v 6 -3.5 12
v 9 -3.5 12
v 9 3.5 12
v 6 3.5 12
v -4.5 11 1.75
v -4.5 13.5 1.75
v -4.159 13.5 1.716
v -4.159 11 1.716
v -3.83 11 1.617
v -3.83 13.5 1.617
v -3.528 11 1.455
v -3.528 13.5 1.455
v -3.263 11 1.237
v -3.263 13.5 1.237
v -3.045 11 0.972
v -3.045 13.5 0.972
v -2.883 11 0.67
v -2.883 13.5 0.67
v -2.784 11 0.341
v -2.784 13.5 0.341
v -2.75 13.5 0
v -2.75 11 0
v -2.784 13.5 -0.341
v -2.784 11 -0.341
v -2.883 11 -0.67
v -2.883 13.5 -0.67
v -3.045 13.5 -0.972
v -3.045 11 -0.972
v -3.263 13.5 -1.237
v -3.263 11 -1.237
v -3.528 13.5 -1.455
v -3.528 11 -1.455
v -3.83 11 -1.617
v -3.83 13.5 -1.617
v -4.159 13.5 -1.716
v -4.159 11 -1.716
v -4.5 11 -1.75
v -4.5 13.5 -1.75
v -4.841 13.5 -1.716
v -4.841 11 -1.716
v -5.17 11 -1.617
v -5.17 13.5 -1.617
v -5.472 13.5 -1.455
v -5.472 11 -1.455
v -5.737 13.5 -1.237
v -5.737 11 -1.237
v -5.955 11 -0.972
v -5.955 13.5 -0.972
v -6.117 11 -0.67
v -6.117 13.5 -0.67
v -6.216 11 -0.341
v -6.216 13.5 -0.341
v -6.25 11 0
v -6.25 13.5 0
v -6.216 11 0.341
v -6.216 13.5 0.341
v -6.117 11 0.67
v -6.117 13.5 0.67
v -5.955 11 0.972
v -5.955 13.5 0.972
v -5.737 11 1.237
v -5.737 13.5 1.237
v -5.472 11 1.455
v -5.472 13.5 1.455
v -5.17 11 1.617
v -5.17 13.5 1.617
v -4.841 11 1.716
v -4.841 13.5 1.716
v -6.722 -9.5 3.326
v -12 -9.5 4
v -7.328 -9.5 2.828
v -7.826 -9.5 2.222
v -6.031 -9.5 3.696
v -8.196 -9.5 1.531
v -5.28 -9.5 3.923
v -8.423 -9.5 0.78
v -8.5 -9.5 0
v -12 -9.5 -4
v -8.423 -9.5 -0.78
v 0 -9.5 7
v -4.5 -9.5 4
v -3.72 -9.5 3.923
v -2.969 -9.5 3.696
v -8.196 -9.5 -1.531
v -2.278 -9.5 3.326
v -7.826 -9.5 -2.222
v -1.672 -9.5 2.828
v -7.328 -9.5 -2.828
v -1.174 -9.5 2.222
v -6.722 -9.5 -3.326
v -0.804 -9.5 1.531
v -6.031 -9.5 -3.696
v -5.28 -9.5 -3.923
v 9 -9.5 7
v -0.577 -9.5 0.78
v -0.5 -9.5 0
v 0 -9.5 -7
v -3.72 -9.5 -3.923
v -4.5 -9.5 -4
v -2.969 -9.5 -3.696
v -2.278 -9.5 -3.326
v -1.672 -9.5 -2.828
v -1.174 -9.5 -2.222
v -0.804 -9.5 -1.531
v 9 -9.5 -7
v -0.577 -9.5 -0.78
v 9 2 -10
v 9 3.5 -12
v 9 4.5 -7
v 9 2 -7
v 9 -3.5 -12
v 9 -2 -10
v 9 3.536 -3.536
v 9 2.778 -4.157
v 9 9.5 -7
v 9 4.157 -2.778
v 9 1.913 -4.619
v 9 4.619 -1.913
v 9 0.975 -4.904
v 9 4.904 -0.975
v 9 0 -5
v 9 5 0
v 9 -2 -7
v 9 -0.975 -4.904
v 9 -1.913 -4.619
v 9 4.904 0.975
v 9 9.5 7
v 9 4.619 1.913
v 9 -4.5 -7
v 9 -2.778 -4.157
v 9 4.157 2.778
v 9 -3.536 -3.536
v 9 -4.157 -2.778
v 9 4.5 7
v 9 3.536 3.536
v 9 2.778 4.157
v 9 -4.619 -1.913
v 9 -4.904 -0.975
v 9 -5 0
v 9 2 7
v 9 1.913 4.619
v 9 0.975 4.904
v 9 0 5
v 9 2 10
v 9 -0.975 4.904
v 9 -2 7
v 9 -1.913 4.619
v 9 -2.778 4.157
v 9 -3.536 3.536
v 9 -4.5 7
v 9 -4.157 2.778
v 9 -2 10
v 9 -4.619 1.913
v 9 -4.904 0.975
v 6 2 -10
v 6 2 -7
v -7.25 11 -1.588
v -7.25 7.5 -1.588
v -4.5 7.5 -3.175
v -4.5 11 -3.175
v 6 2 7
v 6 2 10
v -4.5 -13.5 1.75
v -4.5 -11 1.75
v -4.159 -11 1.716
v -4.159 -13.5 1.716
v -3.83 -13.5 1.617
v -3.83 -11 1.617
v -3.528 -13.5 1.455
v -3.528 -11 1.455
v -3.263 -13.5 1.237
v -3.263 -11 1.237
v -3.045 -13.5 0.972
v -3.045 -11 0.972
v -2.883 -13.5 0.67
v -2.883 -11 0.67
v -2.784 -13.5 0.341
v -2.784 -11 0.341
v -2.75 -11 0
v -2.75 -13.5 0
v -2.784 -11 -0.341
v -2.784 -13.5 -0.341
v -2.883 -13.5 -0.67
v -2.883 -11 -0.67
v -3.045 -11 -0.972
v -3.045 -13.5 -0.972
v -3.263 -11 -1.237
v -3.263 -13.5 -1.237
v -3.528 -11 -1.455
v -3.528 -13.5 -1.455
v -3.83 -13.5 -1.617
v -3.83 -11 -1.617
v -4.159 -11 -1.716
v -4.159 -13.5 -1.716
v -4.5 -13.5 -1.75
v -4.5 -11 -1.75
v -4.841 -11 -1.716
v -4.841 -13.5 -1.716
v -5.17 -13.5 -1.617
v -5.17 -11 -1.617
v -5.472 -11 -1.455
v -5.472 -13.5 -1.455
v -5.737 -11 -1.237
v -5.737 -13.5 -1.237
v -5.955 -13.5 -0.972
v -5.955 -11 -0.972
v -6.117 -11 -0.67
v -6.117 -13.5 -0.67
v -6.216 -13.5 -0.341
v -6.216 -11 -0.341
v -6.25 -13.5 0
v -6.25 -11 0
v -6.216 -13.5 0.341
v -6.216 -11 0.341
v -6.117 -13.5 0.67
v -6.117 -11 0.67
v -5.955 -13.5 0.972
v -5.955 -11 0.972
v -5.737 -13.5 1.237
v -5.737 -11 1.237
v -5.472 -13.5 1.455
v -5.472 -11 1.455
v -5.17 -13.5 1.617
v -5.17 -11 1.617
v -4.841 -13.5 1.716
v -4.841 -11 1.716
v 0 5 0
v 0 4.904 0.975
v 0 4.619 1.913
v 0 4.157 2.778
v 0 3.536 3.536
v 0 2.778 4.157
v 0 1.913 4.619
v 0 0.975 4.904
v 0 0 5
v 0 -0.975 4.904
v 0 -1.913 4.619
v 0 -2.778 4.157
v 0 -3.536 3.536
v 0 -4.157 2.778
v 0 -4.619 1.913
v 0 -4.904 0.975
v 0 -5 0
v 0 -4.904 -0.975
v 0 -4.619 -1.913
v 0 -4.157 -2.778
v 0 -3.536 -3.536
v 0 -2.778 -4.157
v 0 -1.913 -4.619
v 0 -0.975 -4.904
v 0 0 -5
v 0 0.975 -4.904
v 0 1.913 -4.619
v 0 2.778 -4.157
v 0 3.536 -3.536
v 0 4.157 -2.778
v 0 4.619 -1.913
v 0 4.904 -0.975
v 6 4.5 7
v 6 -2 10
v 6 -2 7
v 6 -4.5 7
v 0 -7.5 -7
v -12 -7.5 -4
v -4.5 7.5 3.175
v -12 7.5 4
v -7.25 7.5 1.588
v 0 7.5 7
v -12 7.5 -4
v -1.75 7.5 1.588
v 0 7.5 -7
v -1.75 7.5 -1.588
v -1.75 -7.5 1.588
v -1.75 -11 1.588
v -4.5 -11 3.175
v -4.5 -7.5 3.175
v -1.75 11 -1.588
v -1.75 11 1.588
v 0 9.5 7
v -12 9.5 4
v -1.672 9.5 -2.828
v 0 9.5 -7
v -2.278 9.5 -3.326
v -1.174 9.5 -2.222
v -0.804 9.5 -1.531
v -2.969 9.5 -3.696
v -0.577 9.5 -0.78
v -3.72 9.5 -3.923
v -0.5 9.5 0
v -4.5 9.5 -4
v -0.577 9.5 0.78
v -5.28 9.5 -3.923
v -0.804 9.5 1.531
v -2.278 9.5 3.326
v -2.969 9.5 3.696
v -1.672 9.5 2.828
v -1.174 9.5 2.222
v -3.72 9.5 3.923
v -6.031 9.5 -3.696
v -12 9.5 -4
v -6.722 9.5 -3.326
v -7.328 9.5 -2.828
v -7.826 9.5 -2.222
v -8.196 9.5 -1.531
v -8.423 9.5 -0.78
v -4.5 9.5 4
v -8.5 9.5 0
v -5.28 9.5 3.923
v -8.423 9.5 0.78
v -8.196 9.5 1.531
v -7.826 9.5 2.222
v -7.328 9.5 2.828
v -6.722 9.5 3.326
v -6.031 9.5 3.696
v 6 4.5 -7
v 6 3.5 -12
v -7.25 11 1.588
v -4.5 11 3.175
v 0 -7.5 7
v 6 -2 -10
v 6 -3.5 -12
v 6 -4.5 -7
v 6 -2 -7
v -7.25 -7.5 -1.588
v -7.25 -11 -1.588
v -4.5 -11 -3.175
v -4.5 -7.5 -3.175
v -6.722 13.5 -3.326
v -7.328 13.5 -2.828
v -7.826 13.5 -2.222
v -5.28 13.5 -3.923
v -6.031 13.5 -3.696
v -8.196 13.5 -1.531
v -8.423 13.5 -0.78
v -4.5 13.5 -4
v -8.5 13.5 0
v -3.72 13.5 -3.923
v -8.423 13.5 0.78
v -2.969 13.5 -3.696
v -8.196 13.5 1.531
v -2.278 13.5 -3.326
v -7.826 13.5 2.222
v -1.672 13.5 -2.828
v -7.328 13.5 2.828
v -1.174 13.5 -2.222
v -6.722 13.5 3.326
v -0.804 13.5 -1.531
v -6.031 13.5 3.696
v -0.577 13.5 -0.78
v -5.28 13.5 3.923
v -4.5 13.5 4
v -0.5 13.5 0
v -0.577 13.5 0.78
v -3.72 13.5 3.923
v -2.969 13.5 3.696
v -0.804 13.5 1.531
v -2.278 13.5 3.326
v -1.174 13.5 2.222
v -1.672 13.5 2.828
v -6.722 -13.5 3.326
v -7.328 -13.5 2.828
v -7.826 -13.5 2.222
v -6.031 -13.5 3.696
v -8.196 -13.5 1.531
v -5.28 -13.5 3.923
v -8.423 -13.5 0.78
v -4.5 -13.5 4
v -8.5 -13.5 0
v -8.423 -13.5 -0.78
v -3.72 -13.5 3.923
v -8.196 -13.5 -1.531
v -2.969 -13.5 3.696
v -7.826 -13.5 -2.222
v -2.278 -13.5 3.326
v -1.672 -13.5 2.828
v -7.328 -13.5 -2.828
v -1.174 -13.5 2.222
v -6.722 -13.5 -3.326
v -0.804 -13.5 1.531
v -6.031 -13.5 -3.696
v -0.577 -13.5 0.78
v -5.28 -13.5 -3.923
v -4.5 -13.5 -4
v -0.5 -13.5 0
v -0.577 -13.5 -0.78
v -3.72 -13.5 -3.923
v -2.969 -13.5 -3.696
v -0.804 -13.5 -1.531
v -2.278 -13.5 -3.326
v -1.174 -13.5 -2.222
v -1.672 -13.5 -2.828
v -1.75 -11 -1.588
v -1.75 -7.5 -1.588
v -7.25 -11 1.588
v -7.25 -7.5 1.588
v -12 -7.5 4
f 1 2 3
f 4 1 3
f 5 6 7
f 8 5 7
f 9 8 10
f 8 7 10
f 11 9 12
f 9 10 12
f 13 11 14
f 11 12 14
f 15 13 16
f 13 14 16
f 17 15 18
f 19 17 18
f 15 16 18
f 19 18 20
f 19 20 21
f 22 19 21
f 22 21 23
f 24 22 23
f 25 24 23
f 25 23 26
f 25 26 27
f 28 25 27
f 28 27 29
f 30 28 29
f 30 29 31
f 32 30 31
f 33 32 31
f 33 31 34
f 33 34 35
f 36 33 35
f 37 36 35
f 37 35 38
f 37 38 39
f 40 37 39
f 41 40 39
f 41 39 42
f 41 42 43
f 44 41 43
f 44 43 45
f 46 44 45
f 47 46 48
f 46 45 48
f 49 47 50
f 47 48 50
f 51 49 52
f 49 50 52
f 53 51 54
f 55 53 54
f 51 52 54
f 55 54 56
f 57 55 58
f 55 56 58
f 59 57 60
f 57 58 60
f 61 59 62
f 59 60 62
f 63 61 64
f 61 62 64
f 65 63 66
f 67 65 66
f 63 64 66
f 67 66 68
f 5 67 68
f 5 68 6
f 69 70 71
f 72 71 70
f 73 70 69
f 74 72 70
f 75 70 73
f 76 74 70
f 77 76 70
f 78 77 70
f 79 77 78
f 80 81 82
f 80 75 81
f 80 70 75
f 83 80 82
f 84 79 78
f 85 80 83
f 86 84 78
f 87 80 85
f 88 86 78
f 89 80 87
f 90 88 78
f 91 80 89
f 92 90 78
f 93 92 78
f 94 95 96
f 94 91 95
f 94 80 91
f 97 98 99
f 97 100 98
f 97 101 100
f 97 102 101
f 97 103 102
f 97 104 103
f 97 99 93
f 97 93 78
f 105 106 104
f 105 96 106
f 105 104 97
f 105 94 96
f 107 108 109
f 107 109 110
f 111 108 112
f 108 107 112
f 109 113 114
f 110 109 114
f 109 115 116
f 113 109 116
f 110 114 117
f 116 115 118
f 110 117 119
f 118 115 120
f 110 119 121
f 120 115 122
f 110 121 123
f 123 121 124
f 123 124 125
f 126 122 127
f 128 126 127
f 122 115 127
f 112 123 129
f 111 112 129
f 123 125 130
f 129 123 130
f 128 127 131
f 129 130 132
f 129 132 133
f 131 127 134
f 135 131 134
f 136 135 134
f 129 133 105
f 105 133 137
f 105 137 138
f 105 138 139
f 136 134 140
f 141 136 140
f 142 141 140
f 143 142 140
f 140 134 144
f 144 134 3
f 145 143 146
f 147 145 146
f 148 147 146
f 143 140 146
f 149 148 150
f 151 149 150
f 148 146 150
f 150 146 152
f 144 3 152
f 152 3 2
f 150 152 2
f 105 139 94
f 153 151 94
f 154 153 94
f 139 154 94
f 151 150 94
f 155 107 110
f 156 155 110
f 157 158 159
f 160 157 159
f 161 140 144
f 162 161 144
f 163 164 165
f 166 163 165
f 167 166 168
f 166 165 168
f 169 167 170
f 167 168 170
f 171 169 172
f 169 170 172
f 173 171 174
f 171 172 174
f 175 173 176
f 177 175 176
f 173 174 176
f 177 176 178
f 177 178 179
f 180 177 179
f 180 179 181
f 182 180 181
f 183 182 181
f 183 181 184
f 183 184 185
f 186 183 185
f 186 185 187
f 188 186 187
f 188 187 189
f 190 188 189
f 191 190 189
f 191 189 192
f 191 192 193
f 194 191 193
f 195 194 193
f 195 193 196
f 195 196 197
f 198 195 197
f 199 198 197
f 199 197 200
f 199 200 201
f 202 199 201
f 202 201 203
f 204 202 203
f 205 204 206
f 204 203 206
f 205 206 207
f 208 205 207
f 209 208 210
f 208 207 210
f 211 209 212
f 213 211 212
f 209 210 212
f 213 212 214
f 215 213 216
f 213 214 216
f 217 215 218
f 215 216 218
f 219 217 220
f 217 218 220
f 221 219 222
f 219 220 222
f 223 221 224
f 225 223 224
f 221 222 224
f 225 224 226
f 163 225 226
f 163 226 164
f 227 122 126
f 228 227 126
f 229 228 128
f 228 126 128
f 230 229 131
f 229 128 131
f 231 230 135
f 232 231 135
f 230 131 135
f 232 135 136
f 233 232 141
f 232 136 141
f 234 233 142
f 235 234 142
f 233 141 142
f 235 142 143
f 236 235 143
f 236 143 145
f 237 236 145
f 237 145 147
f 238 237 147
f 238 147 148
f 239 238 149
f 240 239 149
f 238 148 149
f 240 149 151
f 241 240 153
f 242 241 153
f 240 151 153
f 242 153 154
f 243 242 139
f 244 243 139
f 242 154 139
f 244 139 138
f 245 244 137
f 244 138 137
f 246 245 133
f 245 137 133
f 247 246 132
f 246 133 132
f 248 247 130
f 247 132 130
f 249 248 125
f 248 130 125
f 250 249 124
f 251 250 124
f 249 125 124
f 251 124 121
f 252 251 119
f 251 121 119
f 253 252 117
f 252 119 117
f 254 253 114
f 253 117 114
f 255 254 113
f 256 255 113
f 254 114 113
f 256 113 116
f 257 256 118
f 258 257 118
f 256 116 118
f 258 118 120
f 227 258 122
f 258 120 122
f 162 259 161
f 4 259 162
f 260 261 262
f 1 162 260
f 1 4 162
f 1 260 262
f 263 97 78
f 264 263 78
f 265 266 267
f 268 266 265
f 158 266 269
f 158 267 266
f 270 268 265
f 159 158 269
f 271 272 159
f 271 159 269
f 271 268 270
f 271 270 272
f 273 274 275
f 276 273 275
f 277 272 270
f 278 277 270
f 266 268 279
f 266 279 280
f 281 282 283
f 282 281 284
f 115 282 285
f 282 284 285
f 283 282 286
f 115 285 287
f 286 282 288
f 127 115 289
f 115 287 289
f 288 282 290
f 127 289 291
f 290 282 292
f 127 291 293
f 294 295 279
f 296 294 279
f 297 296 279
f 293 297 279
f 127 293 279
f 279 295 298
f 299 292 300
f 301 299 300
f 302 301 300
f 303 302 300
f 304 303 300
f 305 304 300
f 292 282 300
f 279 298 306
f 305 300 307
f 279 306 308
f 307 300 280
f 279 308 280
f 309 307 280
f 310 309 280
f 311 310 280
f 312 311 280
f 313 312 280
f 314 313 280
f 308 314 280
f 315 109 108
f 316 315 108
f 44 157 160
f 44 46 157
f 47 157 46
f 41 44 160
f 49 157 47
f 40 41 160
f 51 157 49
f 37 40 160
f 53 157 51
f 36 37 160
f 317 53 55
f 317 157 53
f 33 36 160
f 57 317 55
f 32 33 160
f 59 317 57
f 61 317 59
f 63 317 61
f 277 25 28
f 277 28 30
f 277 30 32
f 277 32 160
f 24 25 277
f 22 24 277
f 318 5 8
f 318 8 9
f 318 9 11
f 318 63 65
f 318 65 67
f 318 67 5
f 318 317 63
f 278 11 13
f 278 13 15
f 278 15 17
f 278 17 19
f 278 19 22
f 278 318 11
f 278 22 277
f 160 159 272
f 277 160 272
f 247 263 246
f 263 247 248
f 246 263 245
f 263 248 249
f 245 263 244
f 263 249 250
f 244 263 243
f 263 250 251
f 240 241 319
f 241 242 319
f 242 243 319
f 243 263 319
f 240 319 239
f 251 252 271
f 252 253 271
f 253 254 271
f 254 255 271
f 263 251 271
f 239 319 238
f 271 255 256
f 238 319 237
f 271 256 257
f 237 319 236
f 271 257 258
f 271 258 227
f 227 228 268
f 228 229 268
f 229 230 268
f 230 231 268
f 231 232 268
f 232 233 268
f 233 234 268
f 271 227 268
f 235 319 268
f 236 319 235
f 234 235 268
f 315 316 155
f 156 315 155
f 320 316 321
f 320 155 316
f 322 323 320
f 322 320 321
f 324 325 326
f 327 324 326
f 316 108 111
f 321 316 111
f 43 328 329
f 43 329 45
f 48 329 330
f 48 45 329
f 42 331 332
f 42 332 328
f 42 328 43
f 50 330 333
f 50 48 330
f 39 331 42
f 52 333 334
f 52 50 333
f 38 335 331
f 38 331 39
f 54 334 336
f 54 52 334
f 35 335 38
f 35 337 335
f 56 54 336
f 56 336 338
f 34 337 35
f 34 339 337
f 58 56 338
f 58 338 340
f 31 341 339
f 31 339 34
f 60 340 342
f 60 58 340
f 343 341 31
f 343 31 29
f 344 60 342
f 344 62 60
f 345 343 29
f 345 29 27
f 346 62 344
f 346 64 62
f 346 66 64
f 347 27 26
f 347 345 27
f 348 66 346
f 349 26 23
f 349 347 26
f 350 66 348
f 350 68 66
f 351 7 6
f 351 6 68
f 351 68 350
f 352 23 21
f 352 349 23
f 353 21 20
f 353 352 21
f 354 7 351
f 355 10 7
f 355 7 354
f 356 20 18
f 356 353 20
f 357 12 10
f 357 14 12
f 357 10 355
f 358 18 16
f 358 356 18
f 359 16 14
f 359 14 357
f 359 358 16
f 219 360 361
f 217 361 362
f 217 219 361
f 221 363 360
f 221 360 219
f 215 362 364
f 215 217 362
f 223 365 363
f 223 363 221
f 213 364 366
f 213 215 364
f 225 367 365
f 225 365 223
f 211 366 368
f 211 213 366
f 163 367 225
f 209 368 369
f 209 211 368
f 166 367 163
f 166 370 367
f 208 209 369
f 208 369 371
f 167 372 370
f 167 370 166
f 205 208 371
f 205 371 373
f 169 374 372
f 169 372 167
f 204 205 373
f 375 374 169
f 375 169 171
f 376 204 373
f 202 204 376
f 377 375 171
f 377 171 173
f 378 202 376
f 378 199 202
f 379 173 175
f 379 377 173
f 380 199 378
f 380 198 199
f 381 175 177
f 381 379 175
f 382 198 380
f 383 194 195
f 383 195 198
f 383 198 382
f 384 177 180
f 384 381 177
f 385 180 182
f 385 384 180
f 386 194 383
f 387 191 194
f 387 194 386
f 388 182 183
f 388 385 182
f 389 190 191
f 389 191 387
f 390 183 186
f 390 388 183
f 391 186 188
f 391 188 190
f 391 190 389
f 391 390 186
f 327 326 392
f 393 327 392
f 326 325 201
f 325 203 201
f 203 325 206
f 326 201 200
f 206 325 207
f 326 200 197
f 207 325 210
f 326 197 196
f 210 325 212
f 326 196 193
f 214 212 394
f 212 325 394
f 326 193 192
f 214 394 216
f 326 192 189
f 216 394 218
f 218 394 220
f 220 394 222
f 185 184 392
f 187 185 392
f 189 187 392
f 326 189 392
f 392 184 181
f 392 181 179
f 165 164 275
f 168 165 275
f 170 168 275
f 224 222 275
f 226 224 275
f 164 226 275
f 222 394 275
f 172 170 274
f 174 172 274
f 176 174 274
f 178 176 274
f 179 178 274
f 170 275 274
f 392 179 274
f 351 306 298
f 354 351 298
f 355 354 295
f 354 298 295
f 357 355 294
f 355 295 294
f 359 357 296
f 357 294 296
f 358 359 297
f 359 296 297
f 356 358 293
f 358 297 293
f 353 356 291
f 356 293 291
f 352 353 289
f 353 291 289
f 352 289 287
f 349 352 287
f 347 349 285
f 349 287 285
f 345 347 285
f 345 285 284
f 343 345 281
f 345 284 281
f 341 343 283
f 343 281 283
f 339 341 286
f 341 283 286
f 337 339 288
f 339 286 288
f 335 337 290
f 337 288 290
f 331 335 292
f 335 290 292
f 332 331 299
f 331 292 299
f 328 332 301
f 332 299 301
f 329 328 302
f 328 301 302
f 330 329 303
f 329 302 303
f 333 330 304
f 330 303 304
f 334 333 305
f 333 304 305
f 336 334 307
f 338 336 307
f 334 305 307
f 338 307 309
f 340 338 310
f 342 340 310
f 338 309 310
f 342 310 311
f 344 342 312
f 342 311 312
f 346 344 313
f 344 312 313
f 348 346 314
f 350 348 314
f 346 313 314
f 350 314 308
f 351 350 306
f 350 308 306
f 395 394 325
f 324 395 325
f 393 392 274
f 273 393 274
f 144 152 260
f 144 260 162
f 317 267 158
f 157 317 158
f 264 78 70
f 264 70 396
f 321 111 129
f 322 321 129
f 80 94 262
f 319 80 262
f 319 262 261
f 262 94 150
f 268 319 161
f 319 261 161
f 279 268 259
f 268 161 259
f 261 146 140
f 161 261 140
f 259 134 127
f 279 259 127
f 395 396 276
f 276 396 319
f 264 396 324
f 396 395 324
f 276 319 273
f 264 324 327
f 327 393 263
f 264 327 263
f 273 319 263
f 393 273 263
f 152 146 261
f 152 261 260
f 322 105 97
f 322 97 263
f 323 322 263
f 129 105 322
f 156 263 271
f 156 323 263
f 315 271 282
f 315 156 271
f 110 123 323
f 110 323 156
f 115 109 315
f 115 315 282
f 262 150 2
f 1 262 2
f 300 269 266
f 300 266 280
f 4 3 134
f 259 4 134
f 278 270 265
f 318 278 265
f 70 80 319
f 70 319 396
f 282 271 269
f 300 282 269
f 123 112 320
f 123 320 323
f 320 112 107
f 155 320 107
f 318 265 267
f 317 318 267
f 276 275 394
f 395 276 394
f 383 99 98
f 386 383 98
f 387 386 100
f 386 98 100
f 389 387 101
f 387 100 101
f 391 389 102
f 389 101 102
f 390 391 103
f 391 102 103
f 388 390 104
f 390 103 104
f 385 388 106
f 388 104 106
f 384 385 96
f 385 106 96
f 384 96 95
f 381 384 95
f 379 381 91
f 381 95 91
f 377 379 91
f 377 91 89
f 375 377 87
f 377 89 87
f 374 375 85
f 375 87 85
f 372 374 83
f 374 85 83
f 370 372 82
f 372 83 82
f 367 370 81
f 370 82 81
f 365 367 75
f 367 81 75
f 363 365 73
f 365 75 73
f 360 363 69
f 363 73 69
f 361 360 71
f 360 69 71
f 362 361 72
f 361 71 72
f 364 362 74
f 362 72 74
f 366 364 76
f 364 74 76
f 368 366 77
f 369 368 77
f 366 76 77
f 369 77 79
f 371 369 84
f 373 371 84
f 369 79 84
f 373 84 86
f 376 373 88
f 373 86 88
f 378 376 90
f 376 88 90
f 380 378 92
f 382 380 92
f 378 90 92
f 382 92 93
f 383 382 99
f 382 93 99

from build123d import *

# Parameters (mm, degrees)
SKETCH_W        = 19
SKETCH_H        = 14
PAD_DEPTH       = 9
SKETCH001_R     = 5
POCKET_DEPTH    = 9
SKETCH002_W     = 2
SKETCH002_H     = 14
PAD001_DEPTH    = 12
POCKET001_DEPTH = 19.001
SKETCH004_R     = 4
PAD002_DEPTH    = 4
SKETCH005_R     = 4
PAD003_DEPTH    = 4
SKETCH006_R     = 1.75
POCKET002_DEPTH = 27.001
POCKET003_DEPTH = 11
SKETCH008_W     = 4
SKETCH008_H     = 3
PAD004_DEPTH    = 3


with BuildPart() as part:
    # Sketch → Pad (new body)
    with BuildSketch(Plane.YZ):
        Rectangle(SKETCH_W, SKETCH_H)
    extrude(amount=PAD_DEPTH)

    # Sketch001 (on Face6 of Pad) → Pocket (cut)
    with BuildSketch(Plane.YZ.offset(9)):
        Circle(SKETCH001_R)
    extrude(amount=-POCKET_DEPTH, mode=Mode.SUBTRACT)

    # Sketch002 (on Face4 of Pocket) → Pad001 (join)
    with BuildSketch(Plane(origin=(0, 0, 0), x_dir=(0, 1, 0), z_dir=(-1, 0, 0))):
        with Locations((-8.5, 0)):
            Rectangle(SKETCH002_W, SKETCH002_H)
        with Locations((8.5, 0)):
            Rectangle(SKETCH002_W, SKETCH002_H)
    extrude(amount=PAD001_DEPTH)

    # Sketch003 (on Face9 of Pad001) → Pocket001 (cut, through all)
    with BuildSketch(Plane(origin=(0, -9.5, 0), x_dir=(0, 0, -1), z_dir=(0, -1, 0))):
        Polygon((-4, -12), (-7, -12), (-7, 0), align=None)
        Polygon((7, 0), (4, -12), (7, -12), align=None)
    extrude(amount=-POCKET001_DEPTH, mode=Mode.SUBTRACT)

    # Sketch004 (on Face2 of Pocket001) → Pad002 (join)
    with BuildSketch(Plane(origin=(0, -9.5, 0), x_dir=(0, 0, -1), z_dir=(0, -1, 0))):
        with Locations((0, -4.5)):
            Circle(SKETCH004_R)
    extrude(amount=PAD002_DEPTH)

    # Sketch005 (on Face3 of Pad002) → Pad003 (join)
    with BuildSketch(Plane.ZX.offset(9.5)):
        with Locations((0, -4.5)):
            Circle(SKETCH005_R)
    extrude(amount=PAD003_DEPTH)

    # Sketch006 (on Face21 of Pad003) → Pocket002 (cut, through all)
    with BuildSketch(Plane.ZX.offset(13.5)):
        with Locations((0, -4.5)):
            Circle(SKETCH006_R)
    extrude(amount=-POCKET002_DEPTH, mode=Mode.SUBTRACT)

    # Sketch007 → Pocket003 (cut, symmetric)
    with BuildSketch(Plane.XZ):
        Polygon((-1.75, -1.587713), (-1.75, 1.587713), (-4.5, 3.175426), (-7.25, 1.587713), (-7.25, -1.587713), (-4.5, -3.175426), align=None)
    extrude(amount=POCKET003_DEPTH, both=True, mode=Mode.SUBTRACT)

    # Sketch008 (on DatumPlane) → Pad004 (join)
    with BuildSketch(Plane.YZ.offset(9)):
        Polygon((-4.5, 7), (-3.5, 12), (3.5, 12), (4.5, 7), (4.5, 6), (-4.5, 6), align=None)
        with Locations((0, 8.5)):
            Rectangle(SKETCH008_W, SKETCH008_H, mode=Mode.SUBTRACT)
        Polygon((4.5, -7), (3.5, -12), (-3.5, -12), (-4.5, -7), (-4.5, -6), (4.5, -6), align=None)
        with Locations((0, -8.5)):
            Rectangle(SKETCH008_W, SKETCH008_H, mode=Mode.SUBTRACT)
    extrude(amount=-PAD004_DEPTH)


solid = part.part
